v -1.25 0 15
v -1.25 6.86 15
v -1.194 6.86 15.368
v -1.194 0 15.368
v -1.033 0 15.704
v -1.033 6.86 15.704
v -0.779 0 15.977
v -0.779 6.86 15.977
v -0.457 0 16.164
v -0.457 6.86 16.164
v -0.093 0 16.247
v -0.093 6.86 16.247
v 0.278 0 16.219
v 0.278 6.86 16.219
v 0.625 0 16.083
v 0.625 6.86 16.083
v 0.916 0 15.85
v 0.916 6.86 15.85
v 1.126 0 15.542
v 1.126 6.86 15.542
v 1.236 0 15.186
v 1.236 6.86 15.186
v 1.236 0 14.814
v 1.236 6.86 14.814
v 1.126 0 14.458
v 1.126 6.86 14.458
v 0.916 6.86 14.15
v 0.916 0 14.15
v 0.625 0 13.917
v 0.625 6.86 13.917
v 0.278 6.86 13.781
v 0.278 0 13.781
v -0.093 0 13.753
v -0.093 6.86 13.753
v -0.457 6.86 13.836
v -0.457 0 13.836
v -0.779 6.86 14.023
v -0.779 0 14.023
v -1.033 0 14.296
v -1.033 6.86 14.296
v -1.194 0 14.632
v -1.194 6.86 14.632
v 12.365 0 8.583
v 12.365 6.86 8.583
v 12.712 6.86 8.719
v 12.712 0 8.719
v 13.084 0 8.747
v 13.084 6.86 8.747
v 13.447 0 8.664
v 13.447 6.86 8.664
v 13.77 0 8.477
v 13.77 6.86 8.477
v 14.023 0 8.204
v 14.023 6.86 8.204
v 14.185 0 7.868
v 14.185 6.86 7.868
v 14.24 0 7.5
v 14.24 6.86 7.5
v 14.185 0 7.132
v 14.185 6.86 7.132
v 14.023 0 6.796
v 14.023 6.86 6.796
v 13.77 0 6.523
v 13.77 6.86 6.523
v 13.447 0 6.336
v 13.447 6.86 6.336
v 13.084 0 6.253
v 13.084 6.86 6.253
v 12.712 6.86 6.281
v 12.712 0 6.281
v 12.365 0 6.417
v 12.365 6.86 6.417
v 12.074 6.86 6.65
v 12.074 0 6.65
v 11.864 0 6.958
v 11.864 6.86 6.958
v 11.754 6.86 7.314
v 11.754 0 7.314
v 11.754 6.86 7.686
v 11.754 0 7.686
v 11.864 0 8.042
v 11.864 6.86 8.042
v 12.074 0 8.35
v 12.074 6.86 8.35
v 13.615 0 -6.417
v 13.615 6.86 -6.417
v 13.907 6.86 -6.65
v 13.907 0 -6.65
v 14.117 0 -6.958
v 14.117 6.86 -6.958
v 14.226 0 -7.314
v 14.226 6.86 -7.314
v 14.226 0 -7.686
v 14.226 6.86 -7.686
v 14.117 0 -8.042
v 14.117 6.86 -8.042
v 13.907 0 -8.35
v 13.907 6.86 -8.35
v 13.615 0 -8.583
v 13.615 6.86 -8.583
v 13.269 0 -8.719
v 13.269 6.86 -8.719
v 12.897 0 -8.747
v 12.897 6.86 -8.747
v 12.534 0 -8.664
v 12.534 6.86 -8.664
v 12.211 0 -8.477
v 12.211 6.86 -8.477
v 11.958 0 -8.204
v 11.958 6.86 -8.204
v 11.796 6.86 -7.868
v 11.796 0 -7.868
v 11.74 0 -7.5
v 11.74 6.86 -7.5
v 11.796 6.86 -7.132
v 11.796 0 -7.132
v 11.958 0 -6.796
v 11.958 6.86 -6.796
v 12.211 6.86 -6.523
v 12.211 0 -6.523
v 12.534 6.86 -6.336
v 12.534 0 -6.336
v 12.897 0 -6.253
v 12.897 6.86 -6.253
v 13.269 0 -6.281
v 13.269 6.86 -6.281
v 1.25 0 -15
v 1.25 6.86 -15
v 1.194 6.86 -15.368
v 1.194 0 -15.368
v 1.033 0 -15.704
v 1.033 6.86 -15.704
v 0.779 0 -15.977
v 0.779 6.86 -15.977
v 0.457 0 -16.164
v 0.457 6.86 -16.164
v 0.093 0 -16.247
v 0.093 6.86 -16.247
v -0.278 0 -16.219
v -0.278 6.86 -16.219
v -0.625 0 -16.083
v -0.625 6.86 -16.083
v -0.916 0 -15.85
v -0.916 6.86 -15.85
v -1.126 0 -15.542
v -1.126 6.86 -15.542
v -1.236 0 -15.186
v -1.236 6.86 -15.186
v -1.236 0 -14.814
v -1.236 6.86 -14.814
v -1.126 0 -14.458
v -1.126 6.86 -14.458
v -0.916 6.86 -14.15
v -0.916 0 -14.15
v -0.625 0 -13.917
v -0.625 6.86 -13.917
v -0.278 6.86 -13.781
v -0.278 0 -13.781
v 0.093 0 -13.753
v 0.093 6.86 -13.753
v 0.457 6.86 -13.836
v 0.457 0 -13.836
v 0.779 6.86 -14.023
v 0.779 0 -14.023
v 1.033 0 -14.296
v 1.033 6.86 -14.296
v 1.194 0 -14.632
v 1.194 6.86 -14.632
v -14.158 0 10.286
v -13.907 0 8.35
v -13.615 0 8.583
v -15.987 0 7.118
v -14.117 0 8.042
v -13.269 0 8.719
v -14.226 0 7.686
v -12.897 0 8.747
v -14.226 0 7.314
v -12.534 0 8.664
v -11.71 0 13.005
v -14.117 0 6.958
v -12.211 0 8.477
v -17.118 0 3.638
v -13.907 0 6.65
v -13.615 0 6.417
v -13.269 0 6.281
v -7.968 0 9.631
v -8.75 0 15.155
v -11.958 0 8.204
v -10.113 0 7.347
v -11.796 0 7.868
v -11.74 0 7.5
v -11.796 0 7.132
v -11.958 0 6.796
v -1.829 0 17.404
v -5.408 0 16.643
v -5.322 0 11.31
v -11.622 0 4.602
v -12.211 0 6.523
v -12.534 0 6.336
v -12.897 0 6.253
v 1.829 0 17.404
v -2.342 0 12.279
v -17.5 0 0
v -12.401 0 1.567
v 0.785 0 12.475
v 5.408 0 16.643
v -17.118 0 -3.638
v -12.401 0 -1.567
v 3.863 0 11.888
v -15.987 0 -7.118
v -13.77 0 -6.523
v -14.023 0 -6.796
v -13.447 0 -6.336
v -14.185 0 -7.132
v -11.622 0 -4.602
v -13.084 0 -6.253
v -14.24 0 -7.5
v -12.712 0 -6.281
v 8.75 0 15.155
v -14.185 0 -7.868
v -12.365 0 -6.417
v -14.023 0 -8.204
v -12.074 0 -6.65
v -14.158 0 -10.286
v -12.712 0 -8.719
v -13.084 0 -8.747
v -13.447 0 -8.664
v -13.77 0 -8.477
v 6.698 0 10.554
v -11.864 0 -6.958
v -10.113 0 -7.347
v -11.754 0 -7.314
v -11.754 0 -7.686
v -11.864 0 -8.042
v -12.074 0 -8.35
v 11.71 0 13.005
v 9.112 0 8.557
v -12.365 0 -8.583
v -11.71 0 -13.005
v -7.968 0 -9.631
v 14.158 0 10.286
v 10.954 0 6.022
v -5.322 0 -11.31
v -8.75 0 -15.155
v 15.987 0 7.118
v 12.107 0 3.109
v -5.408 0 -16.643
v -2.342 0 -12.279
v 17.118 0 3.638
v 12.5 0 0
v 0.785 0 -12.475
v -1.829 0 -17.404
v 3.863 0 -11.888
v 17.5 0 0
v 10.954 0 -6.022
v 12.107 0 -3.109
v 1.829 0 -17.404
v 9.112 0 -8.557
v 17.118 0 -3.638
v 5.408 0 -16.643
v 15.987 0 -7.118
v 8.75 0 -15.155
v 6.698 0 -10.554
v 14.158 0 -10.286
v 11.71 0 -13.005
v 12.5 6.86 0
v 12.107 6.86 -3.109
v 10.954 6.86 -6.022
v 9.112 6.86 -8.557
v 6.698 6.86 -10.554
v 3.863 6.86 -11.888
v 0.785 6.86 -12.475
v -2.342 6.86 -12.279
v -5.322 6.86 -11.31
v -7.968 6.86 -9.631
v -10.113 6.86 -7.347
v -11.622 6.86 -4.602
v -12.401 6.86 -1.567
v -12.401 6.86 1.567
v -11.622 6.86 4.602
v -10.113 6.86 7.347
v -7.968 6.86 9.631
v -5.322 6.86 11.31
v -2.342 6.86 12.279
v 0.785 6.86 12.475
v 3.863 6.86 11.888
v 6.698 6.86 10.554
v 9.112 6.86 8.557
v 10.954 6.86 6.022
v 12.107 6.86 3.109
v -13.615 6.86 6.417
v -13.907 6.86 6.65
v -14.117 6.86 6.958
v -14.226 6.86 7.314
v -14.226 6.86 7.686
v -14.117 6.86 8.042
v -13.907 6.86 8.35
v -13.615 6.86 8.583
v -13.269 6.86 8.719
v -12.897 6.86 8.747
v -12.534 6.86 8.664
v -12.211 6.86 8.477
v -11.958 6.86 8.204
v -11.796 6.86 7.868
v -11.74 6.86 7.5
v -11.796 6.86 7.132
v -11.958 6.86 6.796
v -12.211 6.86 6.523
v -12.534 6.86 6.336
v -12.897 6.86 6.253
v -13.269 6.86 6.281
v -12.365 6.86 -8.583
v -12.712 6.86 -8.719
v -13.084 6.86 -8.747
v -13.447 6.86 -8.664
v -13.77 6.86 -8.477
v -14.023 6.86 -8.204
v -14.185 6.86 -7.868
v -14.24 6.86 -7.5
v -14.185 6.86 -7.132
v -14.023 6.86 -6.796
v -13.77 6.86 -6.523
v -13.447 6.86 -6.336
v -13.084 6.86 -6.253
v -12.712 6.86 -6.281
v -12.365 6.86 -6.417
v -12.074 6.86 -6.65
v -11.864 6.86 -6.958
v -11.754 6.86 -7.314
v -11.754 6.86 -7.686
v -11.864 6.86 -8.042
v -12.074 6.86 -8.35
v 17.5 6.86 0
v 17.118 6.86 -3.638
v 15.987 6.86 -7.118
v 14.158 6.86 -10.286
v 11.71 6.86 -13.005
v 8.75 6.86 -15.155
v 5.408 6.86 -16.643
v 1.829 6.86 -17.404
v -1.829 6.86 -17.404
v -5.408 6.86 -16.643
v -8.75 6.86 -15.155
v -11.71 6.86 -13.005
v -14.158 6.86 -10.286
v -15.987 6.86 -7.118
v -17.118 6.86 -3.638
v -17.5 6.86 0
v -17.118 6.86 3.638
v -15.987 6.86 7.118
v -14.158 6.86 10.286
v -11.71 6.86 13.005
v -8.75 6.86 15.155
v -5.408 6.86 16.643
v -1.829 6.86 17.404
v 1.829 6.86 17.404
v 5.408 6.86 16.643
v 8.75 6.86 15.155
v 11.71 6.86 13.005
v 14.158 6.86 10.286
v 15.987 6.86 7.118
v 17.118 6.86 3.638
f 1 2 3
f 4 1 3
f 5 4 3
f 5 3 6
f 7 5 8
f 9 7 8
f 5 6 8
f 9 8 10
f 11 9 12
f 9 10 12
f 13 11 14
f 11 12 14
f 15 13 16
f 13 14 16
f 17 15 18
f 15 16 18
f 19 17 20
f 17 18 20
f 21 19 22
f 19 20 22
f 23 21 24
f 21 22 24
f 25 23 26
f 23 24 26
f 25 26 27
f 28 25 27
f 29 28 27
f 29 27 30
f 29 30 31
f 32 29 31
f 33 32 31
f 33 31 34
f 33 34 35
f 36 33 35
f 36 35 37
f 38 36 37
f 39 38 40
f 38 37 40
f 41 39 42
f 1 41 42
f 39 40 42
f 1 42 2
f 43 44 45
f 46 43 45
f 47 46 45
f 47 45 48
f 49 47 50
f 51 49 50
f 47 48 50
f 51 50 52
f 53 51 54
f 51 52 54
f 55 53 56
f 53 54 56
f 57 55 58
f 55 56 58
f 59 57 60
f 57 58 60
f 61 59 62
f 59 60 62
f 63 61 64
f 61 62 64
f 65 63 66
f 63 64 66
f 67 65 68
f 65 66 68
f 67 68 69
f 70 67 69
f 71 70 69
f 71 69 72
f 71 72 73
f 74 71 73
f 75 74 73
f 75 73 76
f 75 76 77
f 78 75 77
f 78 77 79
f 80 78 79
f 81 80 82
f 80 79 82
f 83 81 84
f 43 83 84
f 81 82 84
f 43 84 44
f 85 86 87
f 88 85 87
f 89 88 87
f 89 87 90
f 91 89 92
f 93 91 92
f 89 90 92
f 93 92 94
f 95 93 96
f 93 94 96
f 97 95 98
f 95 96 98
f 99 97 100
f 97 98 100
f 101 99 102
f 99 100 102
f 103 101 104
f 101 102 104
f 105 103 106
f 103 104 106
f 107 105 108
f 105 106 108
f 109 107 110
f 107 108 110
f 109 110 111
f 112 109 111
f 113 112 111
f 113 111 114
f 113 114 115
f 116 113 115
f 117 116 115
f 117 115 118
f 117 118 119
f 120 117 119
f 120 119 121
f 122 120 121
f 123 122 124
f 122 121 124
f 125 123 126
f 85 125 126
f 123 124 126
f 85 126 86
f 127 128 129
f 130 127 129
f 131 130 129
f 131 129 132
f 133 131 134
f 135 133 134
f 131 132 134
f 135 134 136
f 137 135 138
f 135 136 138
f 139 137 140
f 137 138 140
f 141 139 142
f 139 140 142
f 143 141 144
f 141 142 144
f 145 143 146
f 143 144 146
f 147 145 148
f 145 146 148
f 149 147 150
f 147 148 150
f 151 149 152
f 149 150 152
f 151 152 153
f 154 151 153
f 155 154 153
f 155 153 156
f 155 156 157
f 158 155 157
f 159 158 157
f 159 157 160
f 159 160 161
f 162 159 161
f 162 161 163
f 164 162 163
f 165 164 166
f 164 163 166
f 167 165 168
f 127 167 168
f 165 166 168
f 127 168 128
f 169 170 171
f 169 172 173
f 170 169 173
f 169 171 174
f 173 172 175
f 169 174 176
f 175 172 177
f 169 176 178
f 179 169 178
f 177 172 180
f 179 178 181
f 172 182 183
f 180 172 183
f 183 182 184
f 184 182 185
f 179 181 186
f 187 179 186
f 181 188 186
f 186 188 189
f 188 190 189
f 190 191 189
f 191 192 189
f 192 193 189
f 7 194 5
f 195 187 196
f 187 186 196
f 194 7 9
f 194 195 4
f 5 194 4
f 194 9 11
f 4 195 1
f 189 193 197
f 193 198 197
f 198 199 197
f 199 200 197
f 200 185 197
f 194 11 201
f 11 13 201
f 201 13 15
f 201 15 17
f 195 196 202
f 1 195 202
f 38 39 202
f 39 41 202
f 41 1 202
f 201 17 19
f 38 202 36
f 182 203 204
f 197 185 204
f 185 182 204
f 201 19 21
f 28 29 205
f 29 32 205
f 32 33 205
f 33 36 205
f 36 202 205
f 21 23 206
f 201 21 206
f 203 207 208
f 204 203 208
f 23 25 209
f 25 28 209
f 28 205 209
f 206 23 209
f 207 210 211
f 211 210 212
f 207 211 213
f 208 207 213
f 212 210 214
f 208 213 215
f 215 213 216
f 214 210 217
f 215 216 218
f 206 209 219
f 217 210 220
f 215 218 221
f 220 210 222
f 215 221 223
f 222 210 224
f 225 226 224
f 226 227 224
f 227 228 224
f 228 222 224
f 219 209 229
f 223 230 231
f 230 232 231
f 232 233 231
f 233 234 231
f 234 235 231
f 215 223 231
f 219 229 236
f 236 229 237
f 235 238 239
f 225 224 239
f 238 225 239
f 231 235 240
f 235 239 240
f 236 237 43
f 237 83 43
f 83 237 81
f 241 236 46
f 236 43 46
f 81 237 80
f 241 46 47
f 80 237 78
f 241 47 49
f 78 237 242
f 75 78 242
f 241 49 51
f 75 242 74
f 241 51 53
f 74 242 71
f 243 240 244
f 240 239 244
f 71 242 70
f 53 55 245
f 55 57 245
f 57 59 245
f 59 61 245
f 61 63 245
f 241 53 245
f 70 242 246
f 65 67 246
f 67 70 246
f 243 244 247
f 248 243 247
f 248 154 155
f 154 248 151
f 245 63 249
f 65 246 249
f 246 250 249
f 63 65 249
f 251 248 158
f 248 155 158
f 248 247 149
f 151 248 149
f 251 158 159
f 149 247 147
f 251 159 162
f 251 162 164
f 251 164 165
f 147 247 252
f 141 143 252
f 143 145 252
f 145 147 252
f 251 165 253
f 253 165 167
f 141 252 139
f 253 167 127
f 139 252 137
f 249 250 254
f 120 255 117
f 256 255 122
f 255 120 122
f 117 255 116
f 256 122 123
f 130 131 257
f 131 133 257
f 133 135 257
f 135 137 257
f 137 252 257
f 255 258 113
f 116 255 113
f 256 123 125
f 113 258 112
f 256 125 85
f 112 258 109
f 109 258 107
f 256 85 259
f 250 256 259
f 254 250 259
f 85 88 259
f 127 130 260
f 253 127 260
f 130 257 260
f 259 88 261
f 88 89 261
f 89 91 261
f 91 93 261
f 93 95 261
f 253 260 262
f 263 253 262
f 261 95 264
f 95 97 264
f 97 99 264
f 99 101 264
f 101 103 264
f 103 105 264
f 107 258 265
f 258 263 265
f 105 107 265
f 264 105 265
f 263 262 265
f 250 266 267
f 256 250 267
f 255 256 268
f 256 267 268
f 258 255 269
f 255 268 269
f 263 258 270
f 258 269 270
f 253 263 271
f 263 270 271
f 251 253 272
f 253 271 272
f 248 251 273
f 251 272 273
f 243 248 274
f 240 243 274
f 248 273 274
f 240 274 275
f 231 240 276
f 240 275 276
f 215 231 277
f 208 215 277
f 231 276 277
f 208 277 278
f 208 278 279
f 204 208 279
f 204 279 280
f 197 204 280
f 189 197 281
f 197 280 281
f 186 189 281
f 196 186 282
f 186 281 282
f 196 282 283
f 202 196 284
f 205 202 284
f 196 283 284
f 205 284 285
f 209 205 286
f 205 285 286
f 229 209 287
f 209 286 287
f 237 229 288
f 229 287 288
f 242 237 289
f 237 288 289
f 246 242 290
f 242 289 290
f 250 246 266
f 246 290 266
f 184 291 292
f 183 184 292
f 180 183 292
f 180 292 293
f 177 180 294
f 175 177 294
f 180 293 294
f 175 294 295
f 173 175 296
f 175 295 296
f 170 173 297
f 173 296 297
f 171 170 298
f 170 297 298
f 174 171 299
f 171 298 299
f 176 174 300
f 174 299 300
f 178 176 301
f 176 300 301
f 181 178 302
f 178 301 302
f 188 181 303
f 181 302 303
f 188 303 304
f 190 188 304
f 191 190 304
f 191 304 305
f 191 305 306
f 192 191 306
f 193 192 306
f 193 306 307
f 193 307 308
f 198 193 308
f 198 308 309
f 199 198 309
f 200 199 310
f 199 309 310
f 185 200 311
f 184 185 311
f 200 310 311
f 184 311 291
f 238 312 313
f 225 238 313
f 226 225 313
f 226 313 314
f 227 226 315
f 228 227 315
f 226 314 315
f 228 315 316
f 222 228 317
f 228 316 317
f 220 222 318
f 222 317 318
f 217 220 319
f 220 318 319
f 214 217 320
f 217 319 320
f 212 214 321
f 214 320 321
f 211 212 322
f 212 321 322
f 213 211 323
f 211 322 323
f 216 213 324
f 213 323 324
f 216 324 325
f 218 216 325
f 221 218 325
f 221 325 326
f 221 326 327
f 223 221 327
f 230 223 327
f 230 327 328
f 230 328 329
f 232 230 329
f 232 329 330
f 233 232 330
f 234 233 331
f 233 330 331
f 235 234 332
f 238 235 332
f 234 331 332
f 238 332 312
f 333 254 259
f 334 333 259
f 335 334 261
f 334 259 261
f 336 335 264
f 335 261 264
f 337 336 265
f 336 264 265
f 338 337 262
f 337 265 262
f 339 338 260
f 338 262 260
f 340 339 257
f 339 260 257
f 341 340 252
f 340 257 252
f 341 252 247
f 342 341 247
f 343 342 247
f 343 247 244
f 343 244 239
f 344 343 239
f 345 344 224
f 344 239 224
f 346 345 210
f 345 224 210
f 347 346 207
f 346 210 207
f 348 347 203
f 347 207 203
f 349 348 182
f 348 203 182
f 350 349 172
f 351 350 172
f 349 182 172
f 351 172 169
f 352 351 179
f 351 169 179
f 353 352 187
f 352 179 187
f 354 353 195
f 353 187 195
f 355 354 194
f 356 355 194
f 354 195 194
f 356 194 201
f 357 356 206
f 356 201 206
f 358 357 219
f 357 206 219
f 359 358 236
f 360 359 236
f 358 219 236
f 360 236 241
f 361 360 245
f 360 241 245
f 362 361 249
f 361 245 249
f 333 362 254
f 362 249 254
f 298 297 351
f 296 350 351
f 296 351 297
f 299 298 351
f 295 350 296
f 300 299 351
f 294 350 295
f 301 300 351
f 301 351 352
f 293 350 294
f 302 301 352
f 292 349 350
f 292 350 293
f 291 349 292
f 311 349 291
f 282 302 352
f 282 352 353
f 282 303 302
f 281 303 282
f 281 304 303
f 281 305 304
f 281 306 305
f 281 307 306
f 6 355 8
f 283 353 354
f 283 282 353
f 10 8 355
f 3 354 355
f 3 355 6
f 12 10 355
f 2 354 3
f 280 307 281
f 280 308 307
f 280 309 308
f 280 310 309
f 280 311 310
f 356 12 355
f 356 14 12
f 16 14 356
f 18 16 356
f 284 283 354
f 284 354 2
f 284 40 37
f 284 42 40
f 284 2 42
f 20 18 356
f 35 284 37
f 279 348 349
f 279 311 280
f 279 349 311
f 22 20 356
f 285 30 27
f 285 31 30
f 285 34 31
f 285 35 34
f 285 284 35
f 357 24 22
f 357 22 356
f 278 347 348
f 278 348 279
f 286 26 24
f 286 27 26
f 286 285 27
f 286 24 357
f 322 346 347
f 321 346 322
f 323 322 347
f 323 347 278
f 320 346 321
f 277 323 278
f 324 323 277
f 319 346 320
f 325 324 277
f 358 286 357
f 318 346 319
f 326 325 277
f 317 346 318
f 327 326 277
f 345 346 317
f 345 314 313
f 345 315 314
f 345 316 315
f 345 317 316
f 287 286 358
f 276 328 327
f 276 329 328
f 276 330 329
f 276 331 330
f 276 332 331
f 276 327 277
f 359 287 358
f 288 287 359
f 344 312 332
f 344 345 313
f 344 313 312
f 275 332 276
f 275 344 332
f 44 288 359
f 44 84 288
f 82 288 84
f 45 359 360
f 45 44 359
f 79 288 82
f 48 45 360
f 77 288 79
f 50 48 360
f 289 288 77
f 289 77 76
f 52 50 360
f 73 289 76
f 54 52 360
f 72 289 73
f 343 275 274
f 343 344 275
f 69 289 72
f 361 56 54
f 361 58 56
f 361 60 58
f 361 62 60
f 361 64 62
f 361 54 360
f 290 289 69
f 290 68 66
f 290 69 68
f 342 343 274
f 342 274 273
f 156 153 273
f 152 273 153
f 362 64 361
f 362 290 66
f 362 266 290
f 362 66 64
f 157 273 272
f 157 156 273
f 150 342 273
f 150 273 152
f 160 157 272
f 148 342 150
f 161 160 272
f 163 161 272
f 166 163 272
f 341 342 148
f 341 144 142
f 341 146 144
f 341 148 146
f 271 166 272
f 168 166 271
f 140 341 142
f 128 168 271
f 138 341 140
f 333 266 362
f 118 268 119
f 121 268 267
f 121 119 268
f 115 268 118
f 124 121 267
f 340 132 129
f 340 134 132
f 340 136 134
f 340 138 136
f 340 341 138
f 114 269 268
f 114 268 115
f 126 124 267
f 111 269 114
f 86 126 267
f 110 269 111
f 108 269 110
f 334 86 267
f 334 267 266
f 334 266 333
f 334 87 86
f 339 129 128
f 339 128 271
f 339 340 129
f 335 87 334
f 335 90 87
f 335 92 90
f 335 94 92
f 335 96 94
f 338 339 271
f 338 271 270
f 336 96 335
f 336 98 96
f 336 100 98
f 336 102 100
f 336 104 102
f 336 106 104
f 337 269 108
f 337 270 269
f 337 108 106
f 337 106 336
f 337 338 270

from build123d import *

# Parameters (mm, degrees)
SKETCH1_R           = 17.5
BOSS_EXTRUDE1_DEPTH = 6.86
SKETCH2_R           = 12.5
CUT_EXTRUDE1_DEPTH  = 6.86
SKETCH3_R           = 1.25
CUT_EXTRUDE2_DEPTH  = 6.86
CIRPATTERN2_COUNT   = 6


with BuildPart() as part:
    # Sketch1 → Boss-Extrude1 (new body)
    with BuildSketch(Plane(origin=(0, 0, 0), x_dir=(1, 0, 0), z_dir=(0, 1, 0))):
        Circle(SKETCH1_R)
    extrude(amount=BOSS_EXTRUDE1_DEPTH)

    # Sketch2 → Cut-Extrude1 (cut)
    with BuildSketch(Plane(origin=(0, 6.86, 0), x_dir=(1, 0, 0), z_dir=(0, 1, 0))):
        Circle(SKETCH2_R)
    extrude(amount=-CUT_EXTRUDE1_DEPTH, mode=Mode.SUBTRACT)

    # Sketch3 → Cut-Extrude2 (cut)
    with BuildSketch(Plane(origin=(0, 6.86, 0), x_dir=(1, 0, 0), z_dir=(0, 1, 0))):
        with Locations((0, 15)):
            Circle(SKETCH3_R)
    cut_extrude2 = extrude(amount=-CUT_EXTRUDE2_DEPTH, mode=Mode.SUBTRACT)

    # CirPattern2: Cut-Extrude2 ×6 about axis
    cirpattern2_axis = Axis((0, 0, 0), (0, 1, 0))
    for i in range(1, CIRPATTERN2_COUNT):
        add(cut_extrude2.rotate(cirpattern2_axis, i * 360 / CIRPATTERN2_COUNT), mode=Mode.SUBTRACT)


solid = part.part
